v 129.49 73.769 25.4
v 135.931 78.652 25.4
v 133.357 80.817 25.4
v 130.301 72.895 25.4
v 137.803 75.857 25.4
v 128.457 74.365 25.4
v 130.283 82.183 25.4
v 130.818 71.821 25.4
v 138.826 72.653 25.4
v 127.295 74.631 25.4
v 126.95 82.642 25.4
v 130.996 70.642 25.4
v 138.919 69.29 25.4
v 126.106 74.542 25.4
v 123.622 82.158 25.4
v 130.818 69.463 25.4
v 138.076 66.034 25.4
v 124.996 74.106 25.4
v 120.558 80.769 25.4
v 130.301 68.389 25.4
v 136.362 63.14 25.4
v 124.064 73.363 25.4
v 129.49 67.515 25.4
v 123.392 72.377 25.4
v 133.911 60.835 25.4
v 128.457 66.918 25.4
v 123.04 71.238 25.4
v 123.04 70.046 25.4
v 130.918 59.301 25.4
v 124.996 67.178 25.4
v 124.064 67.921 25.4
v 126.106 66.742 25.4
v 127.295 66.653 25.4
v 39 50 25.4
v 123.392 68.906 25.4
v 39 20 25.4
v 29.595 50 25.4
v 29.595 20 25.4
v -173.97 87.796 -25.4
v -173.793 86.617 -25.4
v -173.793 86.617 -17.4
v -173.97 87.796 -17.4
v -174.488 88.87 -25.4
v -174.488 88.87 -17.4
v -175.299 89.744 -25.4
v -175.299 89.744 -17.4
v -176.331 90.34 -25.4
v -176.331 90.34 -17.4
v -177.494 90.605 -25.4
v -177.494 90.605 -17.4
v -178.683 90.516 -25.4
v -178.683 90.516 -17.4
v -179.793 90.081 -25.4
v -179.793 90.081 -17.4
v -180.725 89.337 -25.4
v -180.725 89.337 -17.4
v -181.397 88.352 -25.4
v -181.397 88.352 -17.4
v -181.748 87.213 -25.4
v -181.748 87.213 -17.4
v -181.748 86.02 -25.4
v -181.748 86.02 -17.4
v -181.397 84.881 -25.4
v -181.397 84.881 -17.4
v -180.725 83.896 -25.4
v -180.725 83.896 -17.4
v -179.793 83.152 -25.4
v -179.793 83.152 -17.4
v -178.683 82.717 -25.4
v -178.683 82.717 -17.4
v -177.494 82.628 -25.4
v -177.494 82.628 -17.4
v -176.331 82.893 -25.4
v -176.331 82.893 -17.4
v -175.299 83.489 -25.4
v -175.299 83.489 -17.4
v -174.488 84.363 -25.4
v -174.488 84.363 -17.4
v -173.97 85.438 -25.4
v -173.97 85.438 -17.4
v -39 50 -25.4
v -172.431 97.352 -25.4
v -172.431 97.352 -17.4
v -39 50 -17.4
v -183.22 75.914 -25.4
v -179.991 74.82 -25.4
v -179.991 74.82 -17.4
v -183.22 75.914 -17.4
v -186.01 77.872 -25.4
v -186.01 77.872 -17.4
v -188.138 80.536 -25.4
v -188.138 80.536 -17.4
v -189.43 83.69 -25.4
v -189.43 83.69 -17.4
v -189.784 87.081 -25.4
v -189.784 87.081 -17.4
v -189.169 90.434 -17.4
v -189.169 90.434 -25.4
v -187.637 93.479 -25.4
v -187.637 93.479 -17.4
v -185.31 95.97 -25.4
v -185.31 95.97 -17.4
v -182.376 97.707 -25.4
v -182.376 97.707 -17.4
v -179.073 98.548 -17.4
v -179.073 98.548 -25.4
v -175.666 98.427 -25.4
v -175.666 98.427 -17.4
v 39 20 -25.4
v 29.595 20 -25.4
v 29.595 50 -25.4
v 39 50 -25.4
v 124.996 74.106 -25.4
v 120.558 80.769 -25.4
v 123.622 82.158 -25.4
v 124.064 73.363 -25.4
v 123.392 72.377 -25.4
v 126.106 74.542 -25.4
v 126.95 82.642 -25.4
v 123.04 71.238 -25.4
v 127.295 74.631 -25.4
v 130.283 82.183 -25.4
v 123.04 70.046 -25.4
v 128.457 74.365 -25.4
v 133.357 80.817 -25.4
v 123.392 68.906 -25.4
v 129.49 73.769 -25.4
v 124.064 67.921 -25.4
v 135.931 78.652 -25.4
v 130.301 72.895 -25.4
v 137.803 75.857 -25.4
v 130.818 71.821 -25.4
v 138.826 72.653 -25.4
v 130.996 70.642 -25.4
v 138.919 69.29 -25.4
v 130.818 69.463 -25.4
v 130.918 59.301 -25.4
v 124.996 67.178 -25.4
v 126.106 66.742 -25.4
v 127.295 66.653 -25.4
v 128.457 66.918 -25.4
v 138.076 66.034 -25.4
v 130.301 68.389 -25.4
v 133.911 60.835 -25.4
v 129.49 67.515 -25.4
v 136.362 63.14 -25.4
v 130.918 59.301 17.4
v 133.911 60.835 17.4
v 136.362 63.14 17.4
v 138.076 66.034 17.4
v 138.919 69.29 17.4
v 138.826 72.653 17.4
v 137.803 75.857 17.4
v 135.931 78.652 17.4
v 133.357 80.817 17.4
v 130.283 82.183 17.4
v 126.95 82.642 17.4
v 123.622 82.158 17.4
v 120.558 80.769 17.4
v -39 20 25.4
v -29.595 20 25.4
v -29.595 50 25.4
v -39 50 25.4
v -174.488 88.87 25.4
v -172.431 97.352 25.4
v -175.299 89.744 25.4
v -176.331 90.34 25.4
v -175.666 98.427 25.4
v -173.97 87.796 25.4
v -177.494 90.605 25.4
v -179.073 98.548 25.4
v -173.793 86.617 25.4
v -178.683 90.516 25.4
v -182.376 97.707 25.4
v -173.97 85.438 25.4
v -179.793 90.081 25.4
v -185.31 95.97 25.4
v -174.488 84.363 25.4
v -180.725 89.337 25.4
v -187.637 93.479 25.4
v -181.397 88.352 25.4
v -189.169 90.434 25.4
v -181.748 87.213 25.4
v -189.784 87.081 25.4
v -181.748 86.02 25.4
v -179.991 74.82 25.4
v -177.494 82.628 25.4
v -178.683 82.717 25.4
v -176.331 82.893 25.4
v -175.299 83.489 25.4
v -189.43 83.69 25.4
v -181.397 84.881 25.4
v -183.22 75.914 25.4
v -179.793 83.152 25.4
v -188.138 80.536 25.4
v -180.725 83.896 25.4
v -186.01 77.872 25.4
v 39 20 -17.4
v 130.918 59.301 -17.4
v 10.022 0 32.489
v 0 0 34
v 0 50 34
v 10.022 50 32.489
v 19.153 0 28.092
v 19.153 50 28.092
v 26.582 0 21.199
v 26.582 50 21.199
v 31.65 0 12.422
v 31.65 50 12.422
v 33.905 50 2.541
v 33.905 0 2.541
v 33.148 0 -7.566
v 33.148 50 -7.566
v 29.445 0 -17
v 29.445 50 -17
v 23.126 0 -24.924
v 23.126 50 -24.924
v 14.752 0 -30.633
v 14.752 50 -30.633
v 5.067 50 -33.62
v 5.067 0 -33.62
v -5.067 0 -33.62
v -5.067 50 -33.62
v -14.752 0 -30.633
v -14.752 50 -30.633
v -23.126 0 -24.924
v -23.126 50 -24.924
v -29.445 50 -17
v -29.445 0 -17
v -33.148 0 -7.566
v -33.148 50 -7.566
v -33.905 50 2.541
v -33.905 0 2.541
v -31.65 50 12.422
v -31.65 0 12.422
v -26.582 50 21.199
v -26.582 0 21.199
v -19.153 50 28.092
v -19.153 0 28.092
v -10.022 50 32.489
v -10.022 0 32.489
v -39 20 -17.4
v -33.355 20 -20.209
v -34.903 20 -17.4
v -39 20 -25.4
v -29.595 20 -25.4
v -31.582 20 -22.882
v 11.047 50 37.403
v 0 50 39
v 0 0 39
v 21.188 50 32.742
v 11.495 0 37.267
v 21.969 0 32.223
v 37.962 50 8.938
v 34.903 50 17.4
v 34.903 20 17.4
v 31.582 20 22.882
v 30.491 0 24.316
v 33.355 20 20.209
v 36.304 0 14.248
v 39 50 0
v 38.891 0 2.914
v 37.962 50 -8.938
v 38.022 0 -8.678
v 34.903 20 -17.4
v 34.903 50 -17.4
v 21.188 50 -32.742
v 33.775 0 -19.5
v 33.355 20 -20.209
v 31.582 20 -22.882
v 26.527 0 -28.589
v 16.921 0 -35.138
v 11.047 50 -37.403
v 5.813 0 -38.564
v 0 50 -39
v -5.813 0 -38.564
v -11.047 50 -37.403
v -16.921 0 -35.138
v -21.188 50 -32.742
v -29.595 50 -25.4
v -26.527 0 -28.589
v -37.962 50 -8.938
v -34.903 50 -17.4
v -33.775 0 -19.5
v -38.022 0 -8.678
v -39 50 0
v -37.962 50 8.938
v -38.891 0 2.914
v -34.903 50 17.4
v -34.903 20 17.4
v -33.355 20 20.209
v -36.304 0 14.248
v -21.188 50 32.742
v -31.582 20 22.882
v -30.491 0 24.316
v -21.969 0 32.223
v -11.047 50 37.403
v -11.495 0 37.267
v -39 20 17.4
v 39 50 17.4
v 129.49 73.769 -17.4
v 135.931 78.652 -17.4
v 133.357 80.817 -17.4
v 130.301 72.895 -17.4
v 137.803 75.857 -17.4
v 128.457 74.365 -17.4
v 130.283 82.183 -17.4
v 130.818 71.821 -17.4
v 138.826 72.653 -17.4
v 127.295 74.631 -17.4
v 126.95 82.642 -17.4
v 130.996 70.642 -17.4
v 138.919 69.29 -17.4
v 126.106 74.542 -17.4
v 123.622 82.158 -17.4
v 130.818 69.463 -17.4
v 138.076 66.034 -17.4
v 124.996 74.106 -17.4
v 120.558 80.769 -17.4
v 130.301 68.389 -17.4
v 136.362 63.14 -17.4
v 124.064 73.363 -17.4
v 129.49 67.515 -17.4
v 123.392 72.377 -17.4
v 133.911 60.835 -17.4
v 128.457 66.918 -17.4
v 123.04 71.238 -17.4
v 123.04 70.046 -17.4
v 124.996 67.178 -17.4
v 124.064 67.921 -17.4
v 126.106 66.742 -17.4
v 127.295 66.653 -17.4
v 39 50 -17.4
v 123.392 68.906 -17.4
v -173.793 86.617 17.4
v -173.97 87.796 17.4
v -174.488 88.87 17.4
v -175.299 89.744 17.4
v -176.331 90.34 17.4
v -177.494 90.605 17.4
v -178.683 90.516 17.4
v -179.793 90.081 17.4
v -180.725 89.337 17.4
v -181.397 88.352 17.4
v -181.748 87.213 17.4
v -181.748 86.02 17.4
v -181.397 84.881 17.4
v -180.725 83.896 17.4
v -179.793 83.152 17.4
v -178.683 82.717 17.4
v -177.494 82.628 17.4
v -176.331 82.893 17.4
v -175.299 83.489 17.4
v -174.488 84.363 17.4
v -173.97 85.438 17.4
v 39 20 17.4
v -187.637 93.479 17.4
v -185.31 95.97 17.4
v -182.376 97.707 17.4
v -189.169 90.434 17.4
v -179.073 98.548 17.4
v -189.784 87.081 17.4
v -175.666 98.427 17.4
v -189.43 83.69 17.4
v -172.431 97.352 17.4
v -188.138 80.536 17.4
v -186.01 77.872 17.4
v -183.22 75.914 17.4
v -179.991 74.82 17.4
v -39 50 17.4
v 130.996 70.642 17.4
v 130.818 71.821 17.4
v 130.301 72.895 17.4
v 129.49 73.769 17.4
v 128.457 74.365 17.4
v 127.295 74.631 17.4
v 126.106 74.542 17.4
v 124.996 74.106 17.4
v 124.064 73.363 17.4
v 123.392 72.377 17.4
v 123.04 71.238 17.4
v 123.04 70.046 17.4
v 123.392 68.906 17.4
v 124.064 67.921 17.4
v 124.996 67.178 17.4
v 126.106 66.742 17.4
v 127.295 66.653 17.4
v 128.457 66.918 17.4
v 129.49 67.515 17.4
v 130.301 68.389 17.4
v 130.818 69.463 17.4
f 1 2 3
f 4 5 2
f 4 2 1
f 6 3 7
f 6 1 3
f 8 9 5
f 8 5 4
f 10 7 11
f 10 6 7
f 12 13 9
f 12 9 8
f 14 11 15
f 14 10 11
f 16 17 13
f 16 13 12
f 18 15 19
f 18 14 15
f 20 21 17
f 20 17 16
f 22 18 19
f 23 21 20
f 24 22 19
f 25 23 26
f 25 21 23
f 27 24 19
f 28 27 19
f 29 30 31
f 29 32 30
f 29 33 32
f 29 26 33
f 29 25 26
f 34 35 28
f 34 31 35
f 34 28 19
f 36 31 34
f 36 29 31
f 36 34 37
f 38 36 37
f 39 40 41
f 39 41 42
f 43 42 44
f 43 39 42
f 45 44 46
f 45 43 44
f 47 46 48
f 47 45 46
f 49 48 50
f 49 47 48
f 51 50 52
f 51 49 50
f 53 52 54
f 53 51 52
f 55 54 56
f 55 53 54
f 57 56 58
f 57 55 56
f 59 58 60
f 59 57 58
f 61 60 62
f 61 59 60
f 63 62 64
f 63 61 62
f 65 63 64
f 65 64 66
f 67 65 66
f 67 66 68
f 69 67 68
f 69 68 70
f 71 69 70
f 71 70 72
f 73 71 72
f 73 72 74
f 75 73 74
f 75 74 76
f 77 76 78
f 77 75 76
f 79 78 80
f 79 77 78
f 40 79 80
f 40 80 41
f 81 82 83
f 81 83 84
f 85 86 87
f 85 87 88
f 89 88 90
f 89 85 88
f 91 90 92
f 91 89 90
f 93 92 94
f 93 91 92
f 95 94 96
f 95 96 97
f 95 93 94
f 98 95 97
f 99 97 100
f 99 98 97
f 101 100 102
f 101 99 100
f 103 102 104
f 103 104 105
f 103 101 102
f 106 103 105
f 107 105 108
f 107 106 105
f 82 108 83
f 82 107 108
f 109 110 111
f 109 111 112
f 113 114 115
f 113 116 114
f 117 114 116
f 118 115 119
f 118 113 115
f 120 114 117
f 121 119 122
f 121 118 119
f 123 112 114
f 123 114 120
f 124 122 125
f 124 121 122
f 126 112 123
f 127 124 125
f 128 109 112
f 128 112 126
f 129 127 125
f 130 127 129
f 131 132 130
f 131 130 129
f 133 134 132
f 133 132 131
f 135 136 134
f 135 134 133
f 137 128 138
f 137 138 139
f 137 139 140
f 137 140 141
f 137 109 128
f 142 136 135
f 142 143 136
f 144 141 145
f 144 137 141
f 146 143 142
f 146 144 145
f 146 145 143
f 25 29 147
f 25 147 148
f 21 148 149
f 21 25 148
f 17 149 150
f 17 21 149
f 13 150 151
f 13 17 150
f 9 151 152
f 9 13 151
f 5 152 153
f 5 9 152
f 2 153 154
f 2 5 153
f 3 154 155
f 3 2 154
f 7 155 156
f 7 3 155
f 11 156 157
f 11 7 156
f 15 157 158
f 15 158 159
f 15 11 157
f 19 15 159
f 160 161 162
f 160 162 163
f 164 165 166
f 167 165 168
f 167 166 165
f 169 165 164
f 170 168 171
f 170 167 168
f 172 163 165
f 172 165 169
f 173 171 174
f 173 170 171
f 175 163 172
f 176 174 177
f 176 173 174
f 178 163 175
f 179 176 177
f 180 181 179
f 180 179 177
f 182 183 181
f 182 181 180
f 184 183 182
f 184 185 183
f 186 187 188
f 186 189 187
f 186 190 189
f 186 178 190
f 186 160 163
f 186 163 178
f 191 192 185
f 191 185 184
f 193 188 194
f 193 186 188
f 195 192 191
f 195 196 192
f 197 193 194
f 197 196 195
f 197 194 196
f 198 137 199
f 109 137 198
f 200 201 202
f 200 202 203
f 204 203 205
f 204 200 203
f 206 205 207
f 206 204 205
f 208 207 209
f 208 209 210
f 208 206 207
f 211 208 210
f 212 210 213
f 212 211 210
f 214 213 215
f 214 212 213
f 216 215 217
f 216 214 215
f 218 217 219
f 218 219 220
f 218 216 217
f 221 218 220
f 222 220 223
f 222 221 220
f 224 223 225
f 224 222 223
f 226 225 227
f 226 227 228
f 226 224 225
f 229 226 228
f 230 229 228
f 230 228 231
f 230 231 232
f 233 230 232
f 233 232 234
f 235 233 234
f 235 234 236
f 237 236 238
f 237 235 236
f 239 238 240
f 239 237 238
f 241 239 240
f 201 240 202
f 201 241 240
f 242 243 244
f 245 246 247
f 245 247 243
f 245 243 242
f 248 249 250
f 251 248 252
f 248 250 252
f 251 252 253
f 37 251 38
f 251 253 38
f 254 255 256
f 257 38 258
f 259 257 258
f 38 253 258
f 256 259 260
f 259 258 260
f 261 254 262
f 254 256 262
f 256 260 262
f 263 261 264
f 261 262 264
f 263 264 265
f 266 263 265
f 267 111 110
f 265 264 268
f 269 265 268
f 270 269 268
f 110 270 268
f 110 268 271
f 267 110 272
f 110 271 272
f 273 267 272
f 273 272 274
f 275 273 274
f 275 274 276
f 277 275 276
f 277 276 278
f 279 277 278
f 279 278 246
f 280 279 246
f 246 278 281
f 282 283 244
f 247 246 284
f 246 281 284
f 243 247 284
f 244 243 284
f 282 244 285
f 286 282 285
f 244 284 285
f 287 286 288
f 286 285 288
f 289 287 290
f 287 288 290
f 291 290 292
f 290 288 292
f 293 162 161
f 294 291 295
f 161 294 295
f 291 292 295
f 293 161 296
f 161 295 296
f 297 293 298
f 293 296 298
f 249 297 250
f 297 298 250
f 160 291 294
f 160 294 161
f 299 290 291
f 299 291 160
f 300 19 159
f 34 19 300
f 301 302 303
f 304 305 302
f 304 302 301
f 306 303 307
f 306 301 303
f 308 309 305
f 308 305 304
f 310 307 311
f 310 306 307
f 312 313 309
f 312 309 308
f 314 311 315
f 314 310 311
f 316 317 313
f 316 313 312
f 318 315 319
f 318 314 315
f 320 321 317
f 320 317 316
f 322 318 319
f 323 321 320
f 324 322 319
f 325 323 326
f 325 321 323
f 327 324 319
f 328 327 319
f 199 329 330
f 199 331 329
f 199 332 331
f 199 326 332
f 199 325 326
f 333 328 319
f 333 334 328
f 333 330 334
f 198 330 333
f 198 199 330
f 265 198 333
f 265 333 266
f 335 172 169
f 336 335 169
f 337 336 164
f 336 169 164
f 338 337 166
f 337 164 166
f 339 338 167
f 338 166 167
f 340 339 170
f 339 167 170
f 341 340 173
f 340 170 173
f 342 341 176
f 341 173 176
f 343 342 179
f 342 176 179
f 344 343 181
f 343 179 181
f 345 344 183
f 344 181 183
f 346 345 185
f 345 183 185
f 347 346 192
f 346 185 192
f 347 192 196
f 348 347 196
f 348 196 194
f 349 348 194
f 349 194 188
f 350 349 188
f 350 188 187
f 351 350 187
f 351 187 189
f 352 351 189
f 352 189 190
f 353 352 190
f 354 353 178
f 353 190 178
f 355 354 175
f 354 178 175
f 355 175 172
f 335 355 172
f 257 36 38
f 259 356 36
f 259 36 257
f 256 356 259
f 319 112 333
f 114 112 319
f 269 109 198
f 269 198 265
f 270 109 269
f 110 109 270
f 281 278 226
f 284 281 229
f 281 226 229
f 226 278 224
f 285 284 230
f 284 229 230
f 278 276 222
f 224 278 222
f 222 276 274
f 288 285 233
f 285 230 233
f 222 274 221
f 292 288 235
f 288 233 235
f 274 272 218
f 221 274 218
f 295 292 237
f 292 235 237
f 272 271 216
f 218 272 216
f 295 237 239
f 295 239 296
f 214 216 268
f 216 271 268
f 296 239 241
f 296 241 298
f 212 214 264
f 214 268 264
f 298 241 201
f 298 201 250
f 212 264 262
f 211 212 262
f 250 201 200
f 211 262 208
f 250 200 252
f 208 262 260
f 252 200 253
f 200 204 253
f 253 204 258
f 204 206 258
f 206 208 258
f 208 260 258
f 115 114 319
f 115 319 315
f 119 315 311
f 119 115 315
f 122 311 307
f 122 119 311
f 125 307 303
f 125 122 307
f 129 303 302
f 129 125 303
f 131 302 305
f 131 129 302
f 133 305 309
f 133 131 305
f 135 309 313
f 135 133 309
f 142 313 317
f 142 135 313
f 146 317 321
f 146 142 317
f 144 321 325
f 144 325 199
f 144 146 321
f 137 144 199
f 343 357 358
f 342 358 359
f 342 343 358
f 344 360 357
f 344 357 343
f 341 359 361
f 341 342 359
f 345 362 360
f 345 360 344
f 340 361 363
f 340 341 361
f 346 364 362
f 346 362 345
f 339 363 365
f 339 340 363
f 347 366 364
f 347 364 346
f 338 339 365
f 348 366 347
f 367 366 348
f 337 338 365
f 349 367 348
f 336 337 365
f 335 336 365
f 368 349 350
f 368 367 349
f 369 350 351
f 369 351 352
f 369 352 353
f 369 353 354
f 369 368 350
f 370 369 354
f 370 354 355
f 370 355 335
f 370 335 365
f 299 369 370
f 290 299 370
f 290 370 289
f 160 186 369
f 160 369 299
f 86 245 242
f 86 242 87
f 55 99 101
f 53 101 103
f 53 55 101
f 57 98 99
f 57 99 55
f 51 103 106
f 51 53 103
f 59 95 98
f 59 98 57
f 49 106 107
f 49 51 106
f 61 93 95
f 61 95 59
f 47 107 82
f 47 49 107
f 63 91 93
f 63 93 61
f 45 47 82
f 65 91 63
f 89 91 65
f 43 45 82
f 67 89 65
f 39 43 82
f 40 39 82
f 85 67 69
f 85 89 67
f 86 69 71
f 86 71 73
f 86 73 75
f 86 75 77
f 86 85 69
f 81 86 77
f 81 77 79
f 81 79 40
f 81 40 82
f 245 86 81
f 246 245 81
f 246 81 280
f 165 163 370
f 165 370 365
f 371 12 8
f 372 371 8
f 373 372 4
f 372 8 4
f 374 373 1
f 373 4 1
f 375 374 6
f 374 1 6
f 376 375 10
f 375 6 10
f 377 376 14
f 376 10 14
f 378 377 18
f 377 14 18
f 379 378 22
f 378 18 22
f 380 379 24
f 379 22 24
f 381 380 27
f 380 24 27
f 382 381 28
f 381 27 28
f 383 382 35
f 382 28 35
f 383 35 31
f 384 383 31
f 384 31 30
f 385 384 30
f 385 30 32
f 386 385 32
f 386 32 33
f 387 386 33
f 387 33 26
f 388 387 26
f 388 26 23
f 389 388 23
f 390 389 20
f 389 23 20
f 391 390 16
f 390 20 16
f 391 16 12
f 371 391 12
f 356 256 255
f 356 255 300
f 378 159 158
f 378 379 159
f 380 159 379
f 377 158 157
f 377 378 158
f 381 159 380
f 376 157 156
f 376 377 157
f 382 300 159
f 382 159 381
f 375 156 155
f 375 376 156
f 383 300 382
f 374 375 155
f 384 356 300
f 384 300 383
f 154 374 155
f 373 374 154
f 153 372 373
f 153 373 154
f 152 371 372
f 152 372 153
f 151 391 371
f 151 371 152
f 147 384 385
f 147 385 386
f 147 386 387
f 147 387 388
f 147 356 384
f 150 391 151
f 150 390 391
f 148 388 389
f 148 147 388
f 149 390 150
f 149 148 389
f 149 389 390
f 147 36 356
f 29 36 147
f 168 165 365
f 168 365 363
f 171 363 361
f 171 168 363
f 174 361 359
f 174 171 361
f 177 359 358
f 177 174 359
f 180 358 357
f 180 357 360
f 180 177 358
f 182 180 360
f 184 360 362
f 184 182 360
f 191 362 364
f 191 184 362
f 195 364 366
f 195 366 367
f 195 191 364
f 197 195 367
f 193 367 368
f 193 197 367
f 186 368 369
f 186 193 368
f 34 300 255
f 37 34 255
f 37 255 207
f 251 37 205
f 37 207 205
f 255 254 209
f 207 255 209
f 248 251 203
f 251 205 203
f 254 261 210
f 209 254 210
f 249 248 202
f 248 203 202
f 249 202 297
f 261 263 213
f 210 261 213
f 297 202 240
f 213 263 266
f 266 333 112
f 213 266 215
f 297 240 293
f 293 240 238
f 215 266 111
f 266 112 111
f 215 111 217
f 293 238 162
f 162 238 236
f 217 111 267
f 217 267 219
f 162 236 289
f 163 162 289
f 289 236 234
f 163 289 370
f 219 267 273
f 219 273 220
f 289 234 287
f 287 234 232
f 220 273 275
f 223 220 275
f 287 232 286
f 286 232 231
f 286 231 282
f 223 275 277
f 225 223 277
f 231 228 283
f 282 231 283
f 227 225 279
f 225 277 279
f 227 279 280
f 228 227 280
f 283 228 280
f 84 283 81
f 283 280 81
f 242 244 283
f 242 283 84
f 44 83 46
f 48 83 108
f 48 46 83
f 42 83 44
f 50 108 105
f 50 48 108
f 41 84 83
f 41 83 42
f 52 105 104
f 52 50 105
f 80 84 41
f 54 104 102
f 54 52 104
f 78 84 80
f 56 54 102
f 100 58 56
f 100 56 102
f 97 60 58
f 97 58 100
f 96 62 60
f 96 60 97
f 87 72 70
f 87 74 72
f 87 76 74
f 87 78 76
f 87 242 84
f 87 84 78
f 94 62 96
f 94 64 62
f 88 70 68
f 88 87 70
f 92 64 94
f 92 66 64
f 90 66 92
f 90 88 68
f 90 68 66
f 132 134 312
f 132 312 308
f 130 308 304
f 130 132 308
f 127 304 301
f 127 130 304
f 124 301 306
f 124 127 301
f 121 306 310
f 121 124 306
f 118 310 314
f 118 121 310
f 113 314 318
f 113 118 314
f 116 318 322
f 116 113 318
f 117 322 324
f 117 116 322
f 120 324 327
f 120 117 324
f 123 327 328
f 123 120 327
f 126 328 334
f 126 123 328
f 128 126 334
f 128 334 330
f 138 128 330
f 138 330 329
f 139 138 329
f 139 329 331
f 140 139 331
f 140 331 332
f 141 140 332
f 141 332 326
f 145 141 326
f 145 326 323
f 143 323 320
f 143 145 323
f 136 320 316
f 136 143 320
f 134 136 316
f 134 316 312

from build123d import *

# Parameters (mm, degrees)
SKETCH2_R             = 39
SKETCH2_R_2           = 34
BOSS_EXTRUDE1_DEPTH   = 50
SKETCH3_R             = 4
BOSS_EXTRUDE2_DEPTH   = 8
BOSS_EXTRUDE2_2_DEPTH = 8
SKETCH4_R             = 4
BOSS_EXTRUDE3_DEPTH   = 8
BOSS_EXTRUDE3_2_DEPTH = 8
BOSS_EXTRUDE4_START   = -30
BOSS_EXTRUDE4_DEPTH   = 30


with BuildPart() as part:
    # Sketch2 → Boss-Extrude1 (new body)
    with BuildSketch(Plane(origin=(0, 0, 0), x_dir=(1, 0, 0), z_dir=(0, 1, 0))):
        with Locations(Location((0, 0, 0), (0, 0, 270))):
            Circle(SKETCH2_R)
        with Locations(Location((0, 0, 0), (0, 0, 270))):
            Circle(SKETCH2_R_2, mode=Mode.SUBTRACT)
    extrude(amount=BOSS_EXTRUDE1_DEPTH)



with BuildPart() as body_2:
    # Sketch3 → Boss-Extrude2 (new body)
    with BuildSketch(Plane.XY.offset(25.4)):
        with BuildLine():
            Line((-39, 20), (-39, 50))
            Line((-39, 50), (-172.430922253, 97.352057933))
            ThreePointArc((-172.430922253, 97.352057933), (-189.169388202, 90.433792858), (-179.991273047, 74.819669887))
            Line((-179.991273047, 74.819669887), (-39, 20))
        make_face()
        with Locations((-177.792717004, 86.616548767)):
            Circle(SKETCH3_R, mode=Mode.SUBTRACT)
    extrude(amount=-BOSS_EXTRUDE2_DEPTH)


with BuildPart() as body_3:
    # Sketch3 → Boss-Extrude2 2 (new body)
    with BuildSketch(Plane.XY.offset(25.4)):
        with BuildLine():
            Line((39, 50), (39, 20))
            Line((39, 20), (130.917867667, 59.301005864))
            ThreePointArc((130.917867667, 59.301005864), (137.803128547, 75.857402278), (120.557867662, 80.768823316))
            Line((120.557867662, 80.768823316), (39, 50))
        make_face()
        with Locations((126.99576519, 70.641954332)):
            Circle(SKETCH3_R, mode=Mode.SUBTRACT)
    extrude(amount=-BOSS_EXTRUDE2_2_DEPTH)


with BuildPart() as body_4:
    # Sketch4 → Boss-Extrude3 (new body)
    with BuildSketch(Plane.XY.offset(-25.4)):
        with BuildLine():
            Line((39, 50), (120.557867662, 80.768823316))
            ThreePointArc((120.557867662, 80.768823316), (137.803128547, 75.857402278), (130.917867667, 59.301005864))
            Line((130.917867667, 59.301005864), (39, 20))
            Line((39, 20), (39, 50))
        make_face()
        with Locations((126.99576519, 70.641954332)):
            Circle(SKETCH4_R, mode=Mode.SUBTRACT)
    extrude(amount=BOSS_EXTRUDE3_DEPTH)


with BuildPart() as body_5:
    # Sketch4 → Boss-Extrude3 2 (new body)
    with BuildSketch(Plane.XY.offset(-25.4)):
        with BuildLine():
            Line((-172.430922253, 97.352057933), (-39, 50))
            Line((-39, 50), (-39, 20))
            Line((-39, 20), (-179.991273047, 74.819669887))
            ThreePointArc((-179.991273047, 74.819669887), (-189.169388202, 90.433792858), (-172.430922253, 97.352057933))
        make_face()
        with Locations((-177.792717004, 86.616548767)):
            Circle(SKETCH4_R, mode=Mode.SUBTRACT)
    extrude(amount=BOSS_EXTRUDE3_2_DEPTH)


with BuildPart() as part_1:
    add(part.part)

    add(body_2.part)  # Boss-Extrude4 merges body 2

    add(body_3.part)  # Boss-Extrude4 merges body 3

    add(body_4.part)  # Boss-Extrude4 merges body 4

    add(body_5.part)  # Boss-Extrude4 merges body 5
    # Sketch6 → Boss-Extrude4 (add)
    with BuildSketch(Plane(origin=(0, 50, 0), x_dir=(1, 0, 0), z_dir=(0, 1, 0)).offset(BOSS_EXTRUDE4_START)):
        with BuildLine():
            Line((39, 25.4), (39, 17.4))
            Line((39, 17.4), (34.903294973, 17.4))
            ThreePointArc((34.903294973, 17.4), (32.49606782, 21.563987948), (29.594594101, 25.4))
            Line((29.594594101, 25.4), (39, 25.4))
        make_face()
        with BuildLine():
            Line((39, -17.4), (39, -25.4))
            Line((39, -25.4), (29.594594101, -25.4))
            ThreePointArc((29.594594101, -25.4), (32.49606782, -21.563987948), (34.903294973, -17.4))
            Line((34.903294973, -17.4), (39, -17.4))
        make_face()
        with BuildLine():
            Line((-39, -25.4), (-39, -17.4))
            Line((-39, -17.4), (-34.903294973, -17.4))
            ThreePointArc((-34.903294973, -17.4), (-32.49606782, -21.563987948), (-29.594594101, -25.4))
            Line((-29.594594101, -25.4), (-39, -25.4))
        make_face()
        with BuildLine():
            Line((-39, 17.4), (-39, 25.4))
            Line((-39, 25.4), (-29.594594101, 25.4))
            ThreePointArc((-29.594594101, 25.4), (-32.49606782, 21.563987948), (-34.903294973, 17.4))
            Line((-34.903294973, 17.4), (-39, 17.4))
        make_face()
    extrude(amount=BOSS_EXTRUDE4_DEPTH)


solid = part_1.part
